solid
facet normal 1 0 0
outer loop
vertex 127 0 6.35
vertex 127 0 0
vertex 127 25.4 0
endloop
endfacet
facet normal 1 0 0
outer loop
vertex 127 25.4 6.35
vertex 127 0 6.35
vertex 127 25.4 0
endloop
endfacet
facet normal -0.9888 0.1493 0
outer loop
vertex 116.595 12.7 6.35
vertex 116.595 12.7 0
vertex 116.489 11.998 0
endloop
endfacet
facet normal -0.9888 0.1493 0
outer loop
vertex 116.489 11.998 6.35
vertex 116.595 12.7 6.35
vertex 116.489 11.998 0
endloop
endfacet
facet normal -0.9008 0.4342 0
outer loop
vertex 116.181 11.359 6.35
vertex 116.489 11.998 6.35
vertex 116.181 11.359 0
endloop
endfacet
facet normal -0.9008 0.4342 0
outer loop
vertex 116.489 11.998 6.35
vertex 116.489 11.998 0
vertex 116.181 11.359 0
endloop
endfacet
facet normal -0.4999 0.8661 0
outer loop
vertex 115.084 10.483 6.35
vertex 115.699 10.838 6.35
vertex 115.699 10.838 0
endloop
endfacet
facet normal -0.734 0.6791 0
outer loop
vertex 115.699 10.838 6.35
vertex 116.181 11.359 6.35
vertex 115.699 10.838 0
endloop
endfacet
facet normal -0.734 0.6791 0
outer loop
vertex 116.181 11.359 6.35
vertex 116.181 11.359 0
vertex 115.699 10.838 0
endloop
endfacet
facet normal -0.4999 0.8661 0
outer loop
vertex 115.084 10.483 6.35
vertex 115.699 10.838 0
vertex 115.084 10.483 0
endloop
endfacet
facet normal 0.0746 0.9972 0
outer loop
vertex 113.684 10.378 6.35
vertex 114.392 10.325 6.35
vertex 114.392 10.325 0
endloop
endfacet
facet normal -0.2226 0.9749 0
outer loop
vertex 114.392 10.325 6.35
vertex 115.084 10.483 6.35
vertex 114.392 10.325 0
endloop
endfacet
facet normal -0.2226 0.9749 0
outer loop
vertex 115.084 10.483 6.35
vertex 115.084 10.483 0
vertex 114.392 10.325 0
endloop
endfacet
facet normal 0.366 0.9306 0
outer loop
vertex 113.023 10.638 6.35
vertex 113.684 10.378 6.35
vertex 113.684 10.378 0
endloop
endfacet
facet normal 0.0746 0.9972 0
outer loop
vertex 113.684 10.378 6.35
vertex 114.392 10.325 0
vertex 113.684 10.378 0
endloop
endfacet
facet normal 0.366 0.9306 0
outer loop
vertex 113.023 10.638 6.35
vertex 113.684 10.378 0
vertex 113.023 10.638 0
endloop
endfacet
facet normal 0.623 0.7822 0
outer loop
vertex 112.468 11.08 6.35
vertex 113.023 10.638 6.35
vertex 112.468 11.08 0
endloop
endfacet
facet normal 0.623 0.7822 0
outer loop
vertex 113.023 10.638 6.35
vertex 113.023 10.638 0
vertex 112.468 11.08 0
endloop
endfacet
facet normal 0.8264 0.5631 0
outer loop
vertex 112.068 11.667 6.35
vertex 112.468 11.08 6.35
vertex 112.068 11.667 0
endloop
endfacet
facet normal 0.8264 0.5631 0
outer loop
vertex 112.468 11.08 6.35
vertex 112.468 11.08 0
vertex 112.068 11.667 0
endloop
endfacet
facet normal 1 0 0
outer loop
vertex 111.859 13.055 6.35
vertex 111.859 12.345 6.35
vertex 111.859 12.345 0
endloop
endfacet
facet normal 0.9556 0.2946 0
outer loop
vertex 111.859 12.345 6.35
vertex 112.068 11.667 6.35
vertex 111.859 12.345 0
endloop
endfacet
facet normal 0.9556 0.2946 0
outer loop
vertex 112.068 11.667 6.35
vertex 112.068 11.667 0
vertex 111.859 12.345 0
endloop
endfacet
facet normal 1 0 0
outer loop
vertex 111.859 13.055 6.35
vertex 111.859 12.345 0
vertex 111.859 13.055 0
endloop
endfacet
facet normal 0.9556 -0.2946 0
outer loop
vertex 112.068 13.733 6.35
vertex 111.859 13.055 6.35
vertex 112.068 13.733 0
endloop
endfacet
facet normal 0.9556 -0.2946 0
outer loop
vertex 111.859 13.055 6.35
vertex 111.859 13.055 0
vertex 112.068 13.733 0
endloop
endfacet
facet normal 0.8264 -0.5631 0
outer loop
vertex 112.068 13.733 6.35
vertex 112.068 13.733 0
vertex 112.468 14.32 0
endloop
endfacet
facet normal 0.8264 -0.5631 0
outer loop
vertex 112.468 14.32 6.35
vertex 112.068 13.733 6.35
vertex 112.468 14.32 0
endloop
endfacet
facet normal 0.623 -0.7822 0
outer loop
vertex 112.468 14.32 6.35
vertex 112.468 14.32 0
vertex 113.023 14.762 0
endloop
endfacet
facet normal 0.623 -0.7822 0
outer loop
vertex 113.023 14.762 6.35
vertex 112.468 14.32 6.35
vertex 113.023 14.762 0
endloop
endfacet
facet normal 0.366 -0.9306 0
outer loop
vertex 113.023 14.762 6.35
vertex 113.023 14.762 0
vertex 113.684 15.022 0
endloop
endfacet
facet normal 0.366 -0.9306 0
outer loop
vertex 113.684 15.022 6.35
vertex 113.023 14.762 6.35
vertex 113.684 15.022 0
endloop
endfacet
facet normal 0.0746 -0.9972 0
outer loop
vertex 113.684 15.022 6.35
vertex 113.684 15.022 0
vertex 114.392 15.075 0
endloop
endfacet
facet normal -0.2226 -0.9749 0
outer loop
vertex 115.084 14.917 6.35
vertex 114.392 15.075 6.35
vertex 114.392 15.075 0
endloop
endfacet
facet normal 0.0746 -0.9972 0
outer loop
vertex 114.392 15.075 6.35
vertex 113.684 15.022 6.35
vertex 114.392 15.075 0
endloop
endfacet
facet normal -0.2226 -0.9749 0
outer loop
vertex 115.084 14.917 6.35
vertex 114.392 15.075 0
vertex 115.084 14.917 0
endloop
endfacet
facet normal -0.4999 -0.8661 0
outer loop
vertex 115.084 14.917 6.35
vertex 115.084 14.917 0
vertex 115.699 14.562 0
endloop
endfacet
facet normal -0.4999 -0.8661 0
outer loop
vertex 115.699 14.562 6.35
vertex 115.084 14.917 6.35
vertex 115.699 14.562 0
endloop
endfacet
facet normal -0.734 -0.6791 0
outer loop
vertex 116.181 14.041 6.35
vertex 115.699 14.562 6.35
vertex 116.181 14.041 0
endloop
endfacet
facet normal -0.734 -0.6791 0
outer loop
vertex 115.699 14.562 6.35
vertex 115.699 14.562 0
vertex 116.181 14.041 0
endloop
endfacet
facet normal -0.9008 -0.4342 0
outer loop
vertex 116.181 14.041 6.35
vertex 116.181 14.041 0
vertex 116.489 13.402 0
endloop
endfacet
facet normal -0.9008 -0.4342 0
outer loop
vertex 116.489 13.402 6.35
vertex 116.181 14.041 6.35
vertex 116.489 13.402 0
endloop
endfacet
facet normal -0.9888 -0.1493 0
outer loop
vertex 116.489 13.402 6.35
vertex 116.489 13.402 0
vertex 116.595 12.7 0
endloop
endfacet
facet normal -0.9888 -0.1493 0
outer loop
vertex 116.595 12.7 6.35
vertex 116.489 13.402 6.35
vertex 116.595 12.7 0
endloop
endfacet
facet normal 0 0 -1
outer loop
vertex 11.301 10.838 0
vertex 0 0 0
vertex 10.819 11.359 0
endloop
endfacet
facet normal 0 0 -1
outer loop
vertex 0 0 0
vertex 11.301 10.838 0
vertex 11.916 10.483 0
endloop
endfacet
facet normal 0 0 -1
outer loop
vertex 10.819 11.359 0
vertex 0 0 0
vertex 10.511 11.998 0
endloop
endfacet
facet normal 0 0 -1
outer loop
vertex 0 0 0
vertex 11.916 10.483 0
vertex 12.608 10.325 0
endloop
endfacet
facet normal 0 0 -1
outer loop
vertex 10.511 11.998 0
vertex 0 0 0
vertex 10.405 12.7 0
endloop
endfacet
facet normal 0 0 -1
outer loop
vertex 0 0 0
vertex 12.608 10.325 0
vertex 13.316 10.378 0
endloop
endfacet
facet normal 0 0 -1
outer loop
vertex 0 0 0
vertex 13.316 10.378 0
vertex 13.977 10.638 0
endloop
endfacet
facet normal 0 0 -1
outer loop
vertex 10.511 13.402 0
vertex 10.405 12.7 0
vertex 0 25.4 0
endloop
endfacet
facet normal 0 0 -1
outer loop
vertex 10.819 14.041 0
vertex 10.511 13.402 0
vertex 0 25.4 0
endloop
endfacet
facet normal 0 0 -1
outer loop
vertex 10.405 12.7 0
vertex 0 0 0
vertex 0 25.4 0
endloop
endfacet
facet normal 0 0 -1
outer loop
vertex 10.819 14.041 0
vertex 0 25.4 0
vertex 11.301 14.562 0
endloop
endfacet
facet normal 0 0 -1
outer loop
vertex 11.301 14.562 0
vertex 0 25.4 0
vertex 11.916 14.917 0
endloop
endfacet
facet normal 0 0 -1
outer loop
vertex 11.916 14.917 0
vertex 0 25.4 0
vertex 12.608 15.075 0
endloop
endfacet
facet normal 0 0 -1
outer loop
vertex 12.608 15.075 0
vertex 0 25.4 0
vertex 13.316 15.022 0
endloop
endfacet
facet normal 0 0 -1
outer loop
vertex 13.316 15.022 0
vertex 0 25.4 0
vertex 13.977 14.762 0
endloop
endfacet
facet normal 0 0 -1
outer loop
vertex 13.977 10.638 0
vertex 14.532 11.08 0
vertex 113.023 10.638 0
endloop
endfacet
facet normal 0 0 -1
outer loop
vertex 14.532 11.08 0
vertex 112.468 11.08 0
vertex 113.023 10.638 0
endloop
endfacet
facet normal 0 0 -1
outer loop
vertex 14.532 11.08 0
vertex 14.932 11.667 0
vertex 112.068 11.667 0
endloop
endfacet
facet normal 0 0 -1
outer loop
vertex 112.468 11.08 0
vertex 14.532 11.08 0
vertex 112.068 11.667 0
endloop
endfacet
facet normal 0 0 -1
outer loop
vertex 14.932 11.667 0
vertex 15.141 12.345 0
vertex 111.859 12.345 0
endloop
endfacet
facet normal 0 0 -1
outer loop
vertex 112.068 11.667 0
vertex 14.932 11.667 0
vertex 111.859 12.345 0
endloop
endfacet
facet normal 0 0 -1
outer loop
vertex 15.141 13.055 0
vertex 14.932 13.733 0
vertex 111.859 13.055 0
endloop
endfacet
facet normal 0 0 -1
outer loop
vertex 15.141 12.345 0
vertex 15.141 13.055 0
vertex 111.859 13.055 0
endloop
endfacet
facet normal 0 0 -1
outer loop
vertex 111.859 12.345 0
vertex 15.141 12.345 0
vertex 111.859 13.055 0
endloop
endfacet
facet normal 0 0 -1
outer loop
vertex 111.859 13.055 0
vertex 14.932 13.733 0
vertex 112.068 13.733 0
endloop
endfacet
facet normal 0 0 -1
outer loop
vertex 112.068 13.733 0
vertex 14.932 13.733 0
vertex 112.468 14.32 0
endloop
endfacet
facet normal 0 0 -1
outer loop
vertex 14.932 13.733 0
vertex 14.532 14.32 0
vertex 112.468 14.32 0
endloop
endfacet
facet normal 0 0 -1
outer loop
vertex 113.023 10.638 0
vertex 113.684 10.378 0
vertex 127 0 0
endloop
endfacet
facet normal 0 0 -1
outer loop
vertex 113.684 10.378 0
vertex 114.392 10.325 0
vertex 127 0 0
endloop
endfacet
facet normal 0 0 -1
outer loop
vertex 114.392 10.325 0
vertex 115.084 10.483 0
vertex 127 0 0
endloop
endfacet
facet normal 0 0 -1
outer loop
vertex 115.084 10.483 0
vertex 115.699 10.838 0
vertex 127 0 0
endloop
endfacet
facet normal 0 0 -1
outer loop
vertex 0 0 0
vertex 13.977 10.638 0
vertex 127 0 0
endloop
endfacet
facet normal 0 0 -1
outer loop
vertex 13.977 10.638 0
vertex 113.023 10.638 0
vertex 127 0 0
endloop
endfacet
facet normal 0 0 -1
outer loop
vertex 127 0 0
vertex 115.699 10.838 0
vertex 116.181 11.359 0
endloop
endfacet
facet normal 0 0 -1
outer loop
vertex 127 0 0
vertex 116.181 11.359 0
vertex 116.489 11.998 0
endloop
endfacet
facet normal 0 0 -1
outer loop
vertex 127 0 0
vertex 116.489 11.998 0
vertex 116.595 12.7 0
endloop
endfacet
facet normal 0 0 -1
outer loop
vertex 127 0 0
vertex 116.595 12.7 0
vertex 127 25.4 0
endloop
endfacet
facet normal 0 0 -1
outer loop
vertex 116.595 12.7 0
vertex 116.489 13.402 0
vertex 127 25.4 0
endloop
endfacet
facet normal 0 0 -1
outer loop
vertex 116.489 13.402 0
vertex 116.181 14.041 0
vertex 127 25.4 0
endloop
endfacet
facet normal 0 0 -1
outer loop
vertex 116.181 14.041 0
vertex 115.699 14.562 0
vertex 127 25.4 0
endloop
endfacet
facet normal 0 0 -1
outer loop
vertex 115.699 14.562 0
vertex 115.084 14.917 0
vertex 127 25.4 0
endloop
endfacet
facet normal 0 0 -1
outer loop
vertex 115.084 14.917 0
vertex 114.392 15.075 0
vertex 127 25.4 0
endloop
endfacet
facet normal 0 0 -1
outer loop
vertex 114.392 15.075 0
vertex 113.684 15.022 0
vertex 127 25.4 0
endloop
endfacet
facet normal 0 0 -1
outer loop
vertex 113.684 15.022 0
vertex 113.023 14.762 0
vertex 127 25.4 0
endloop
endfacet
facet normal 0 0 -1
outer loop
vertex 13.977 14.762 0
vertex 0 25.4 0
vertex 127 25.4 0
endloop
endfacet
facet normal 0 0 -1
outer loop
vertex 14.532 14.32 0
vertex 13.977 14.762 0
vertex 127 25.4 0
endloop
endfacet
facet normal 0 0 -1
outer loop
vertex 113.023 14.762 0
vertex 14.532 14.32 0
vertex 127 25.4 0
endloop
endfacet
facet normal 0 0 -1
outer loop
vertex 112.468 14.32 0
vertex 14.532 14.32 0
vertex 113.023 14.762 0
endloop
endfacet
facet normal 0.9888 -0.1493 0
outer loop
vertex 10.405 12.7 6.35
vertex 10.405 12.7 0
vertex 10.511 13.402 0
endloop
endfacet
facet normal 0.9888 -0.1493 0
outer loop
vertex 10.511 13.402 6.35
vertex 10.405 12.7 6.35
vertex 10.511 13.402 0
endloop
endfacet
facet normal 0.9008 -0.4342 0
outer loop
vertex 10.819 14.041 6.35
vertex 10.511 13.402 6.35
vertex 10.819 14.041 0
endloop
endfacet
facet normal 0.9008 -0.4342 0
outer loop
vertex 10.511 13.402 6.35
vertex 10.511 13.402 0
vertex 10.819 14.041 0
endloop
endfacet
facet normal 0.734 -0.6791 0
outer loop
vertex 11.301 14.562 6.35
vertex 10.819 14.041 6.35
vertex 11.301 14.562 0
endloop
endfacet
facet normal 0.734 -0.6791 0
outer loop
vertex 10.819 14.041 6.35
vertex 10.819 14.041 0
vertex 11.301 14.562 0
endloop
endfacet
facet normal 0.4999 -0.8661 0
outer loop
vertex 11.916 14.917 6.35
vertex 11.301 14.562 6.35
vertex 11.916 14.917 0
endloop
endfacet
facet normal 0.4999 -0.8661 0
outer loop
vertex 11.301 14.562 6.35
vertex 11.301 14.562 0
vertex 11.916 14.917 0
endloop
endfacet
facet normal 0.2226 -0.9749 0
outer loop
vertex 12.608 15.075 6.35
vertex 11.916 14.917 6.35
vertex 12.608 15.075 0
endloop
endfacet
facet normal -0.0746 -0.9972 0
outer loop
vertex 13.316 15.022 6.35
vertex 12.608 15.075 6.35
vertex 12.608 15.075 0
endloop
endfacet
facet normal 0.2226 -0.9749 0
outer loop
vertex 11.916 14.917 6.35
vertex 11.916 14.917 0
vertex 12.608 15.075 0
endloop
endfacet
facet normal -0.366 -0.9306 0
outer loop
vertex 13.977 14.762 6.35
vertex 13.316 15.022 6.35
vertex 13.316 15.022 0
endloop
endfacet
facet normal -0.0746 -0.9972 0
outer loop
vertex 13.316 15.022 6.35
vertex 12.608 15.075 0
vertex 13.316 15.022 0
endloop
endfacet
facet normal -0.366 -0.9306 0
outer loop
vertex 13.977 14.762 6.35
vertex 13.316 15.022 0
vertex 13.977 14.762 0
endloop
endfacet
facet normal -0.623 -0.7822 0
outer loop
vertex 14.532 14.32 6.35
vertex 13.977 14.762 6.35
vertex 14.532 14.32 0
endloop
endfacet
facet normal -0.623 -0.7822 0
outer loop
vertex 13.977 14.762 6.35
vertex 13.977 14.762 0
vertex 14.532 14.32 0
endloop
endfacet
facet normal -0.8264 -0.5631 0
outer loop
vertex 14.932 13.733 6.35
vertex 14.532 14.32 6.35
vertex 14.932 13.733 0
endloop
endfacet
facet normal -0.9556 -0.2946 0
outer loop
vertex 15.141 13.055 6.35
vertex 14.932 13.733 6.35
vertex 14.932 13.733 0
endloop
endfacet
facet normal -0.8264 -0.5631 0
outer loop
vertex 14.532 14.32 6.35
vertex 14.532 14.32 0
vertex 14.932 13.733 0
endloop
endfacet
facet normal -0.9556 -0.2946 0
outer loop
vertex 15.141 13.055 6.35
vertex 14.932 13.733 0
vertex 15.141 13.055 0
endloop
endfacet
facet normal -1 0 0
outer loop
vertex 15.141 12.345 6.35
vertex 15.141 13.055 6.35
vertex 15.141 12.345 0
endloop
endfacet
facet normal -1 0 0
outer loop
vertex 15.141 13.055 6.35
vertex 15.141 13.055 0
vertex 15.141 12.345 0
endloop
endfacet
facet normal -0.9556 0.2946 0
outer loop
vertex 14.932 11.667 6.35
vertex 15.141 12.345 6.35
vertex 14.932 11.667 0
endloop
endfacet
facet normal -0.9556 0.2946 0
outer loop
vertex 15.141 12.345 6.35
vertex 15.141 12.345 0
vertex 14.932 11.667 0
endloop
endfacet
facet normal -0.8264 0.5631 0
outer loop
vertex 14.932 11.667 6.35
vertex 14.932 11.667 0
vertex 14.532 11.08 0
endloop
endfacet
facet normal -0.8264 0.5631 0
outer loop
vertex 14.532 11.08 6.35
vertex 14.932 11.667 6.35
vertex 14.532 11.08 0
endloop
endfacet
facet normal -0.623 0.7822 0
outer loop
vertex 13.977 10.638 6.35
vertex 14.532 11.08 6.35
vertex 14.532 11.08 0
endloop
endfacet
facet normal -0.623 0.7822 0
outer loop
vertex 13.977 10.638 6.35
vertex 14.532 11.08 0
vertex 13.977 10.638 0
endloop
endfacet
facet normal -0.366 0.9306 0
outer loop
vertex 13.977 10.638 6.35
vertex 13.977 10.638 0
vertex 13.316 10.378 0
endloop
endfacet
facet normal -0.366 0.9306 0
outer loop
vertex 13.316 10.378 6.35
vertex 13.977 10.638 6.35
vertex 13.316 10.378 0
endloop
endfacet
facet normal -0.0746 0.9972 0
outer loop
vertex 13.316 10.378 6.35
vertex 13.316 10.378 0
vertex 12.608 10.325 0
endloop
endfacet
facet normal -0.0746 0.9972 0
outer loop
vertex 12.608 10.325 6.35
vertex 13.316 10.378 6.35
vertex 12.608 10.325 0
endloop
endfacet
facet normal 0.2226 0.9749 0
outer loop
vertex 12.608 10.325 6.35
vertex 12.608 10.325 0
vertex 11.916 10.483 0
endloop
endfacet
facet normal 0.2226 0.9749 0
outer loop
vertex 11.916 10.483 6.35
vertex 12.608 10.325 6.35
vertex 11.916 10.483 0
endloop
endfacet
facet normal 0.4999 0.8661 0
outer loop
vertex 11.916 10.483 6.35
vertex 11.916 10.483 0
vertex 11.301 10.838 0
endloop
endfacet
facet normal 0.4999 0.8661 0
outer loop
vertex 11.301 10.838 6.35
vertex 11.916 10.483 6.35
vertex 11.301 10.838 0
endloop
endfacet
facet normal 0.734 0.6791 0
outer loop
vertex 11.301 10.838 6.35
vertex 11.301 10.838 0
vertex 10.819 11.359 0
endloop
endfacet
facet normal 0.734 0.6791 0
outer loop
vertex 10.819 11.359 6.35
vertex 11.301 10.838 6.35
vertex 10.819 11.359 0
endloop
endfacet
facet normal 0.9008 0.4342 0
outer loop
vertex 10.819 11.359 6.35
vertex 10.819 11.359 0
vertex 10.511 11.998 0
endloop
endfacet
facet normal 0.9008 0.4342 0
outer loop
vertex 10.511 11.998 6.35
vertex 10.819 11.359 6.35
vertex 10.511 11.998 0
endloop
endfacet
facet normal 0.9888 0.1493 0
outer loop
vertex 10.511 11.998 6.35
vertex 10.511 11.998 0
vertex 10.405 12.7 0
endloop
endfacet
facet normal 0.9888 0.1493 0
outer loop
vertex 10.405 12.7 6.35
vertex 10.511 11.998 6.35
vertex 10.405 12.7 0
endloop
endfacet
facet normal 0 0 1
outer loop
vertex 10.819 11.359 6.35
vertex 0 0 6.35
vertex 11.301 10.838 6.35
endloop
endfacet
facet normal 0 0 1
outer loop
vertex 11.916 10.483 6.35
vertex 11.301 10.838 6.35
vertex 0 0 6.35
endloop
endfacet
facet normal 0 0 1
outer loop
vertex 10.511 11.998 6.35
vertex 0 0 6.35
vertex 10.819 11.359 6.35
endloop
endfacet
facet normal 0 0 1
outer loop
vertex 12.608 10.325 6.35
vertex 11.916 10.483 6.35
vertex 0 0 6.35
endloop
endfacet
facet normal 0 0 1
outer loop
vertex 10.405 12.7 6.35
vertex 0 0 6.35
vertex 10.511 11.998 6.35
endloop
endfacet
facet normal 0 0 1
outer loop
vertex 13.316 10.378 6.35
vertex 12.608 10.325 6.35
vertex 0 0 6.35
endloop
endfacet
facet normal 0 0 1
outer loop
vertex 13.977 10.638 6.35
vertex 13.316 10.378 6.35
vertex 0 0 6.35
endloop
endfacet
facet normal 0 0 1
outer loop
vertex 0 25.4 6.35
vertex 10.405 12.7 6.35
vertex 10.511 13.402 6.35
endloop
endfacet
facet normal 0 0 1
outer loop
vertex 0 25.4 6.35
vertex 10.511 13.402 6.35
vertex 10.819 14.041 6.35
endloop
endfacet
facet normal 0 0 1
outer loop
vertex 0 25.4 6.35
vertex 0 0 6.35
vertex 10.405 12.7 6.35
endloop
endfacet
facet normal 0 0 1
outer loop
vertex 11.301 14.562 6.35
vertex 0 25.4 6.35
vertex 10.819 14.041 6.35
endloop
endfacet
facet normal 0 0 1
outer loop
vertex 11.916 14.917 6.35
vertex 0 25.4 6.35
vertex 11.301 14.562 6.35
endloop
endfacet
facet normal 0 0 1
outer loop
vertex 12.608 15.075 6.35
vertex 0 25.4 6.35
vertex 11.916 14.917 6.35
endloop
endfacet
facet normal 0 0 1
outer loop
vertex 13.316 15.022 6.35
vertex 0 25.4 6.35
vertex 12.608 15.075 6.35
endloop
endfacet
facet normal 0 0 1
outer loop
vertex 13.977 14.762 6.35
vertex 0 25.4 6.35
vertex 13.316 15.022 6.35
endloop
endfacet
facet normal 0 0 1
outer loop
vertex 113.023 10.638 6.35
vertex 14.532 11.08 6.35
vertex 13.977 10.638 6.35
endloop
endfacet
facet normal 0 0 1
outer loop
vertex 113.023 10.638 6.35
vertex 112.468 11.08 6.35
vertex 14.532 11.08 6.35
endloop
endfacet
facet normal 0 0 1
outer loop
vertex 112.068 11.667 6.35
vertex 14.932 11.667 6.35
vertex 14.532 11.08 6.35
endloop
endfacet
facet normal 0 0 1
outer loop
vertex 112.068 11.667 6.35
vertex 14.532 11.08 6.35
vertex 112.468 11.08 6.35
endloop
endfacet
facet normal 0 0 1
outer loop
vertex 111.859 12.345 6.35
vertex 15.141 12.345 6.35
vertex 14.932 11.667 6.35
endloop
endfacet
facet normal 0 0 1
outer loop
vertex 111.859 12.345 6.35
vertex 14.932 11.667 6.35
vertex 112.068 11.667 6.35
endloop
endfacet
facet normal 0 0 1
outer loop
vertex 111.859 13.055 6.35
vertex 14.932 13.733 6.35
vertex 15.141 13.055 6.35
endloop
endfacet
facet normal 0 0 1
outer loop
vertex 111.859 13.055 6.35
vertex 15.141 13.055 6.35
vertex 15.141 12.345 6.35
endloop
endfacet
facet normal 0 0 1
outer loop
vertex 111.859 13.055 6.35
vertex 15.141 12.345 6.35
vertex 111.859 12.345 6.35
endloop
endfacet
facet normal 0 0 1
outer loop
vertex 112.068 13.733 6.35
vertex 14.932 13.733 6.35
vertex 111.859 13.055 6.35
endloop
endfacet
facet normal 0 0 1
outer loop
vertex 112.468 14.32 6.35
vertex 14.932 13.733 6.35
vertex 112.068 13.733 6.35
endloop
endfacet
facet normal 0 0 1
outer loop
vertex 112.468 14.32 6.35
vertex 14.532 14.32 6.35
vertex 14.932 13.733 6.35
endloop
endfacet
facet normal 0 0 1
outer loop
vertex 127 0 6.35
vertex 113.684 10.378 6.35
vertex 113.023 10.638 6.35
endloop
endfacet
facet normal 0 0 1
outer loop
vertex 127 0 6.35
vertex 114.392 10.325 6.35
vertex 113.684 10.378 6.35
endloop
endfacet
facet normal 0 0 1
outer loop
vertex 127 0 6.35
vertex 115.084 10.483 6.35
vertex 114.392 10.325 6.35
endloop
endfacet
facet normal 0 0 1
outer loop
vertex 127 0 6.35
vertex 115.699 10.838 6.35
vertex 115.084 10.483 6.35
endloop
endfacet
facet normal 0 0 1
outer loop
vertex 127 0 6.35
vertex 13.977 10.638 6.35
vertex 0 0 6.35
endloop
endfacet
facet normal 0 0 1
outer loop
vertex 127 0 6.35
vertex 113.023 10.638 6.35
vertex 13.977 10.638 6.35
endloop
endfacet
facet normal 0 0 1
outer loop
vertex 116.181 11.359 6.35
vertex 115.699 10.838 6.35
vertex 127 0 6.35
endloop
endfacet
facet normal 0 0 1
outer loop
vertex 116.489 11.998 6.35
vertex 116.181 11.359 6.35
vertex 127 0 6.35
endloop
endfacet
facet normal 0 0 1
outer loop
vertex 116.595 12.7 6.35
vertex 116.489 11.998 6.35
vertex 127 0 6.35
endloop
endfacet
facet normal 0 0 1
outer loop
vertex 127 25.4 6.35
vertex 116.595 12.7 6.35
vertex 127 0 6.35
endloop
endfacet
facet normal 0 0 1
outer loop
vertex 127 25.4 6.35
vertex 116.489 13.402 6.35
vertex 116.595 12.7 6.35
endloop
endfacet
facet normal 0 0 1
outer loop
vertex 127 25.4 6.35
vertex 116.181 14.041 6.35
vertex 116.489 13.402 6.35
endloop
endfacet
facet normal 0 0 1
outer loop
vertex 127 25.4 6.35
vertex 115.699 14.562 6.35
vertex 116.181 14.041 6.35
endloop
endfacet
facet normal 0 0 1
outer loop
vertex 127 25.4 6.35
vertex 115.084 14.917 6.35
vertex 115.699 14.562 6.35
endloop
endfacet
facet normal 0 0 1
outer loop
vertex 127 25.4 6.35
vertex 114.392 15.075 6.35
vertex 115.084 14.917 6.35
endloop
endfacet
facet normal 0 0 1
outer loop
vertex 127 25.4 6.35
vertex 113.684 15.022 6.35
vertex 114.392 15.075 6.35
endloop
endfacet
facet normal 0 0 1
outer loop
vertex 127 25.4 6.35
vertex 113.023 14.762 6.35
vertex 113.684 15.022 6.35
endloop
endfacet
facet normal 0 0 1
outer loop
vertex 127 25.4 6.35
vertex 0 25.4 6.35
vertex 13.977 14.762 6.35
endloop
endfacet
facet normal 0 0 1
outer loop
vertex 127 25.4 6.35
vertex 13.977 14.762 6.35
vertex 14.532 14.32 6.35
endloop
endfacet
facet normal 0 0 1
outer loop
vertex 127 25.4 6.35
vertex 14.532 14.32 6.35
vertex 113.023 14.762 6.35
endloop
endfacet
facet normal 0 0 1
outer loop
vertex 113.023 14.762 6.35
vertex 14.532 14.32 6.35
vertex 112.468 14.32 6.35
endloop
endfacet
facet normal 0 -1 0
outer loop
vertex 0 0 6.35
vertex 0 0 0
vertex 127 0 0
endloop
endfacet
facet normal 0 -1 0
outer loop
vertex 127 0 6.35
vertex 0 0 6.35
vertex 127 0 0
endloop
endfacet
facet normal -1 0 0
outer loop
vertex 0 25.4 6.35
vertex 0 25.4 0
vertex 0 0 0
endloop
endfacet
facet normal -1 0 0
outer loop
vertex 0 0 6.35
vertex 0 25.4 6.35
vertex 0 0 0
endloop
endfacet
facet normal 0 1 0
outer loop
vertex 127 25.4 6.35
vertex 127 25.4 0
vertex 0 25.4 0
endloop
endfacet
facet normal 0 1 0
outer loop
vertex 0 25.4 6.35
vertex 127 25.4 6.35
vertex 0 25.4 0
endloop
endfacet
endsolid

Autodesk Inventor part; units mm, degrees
ref_plane "YZ Plane" through (0, 0, 0) normal (1, 0, 0) x (0, 1, 0)
ref_plane "XZ Plane" through (0, 0, 0) normal (0, 1, 0) x (-1, 0, 0)
sketch "Sketch1" plane through (0, 0, 0) normal (0, 0, 1) x (1, 0, 0)
  line L0 (0, 0) -> (127, 0)
  line L1 (127, 0) -> (127, 25.4)
  line L2 (127, 25.4) -> (0, 25.4)
  line L3 (0, 25.4) -> (0, 0)
  dimension "d0" = 127
  dimension "d1" = 25.4
extrude "Extrusion1" add sketch "Sketch1" along normal blind 6.35
sketch "Sketch2" plane through (0, 0, 0) normal (0, 0, -1) x (-1, 0, 0)
  line L0 (-127, 25.4) -> (0, 25.4) projected
  line L1 (0, 25.4) -> (0, 0) projected
  circle A0 centre (-12.7862, 12.7) radius 2.3813
  dimension "d4" = 12.7
  dimension "d5" = 12.7862
  dimension "d6" = 4.7625
extrude "Extrusion2" cut sketch "Sketch2" against normal blind 6.35
ref_plane "Work Plane1" through (63.5, 0, 0) normal (-1, 0, 0) x (0, 0, 1)
mirror "Mirror1" about plane through (63.5, 0, 0) normal (-1, 0, 0) of "Extrusion2"
properties part number "Plate that touches lift" material "Aluminum 6061"
